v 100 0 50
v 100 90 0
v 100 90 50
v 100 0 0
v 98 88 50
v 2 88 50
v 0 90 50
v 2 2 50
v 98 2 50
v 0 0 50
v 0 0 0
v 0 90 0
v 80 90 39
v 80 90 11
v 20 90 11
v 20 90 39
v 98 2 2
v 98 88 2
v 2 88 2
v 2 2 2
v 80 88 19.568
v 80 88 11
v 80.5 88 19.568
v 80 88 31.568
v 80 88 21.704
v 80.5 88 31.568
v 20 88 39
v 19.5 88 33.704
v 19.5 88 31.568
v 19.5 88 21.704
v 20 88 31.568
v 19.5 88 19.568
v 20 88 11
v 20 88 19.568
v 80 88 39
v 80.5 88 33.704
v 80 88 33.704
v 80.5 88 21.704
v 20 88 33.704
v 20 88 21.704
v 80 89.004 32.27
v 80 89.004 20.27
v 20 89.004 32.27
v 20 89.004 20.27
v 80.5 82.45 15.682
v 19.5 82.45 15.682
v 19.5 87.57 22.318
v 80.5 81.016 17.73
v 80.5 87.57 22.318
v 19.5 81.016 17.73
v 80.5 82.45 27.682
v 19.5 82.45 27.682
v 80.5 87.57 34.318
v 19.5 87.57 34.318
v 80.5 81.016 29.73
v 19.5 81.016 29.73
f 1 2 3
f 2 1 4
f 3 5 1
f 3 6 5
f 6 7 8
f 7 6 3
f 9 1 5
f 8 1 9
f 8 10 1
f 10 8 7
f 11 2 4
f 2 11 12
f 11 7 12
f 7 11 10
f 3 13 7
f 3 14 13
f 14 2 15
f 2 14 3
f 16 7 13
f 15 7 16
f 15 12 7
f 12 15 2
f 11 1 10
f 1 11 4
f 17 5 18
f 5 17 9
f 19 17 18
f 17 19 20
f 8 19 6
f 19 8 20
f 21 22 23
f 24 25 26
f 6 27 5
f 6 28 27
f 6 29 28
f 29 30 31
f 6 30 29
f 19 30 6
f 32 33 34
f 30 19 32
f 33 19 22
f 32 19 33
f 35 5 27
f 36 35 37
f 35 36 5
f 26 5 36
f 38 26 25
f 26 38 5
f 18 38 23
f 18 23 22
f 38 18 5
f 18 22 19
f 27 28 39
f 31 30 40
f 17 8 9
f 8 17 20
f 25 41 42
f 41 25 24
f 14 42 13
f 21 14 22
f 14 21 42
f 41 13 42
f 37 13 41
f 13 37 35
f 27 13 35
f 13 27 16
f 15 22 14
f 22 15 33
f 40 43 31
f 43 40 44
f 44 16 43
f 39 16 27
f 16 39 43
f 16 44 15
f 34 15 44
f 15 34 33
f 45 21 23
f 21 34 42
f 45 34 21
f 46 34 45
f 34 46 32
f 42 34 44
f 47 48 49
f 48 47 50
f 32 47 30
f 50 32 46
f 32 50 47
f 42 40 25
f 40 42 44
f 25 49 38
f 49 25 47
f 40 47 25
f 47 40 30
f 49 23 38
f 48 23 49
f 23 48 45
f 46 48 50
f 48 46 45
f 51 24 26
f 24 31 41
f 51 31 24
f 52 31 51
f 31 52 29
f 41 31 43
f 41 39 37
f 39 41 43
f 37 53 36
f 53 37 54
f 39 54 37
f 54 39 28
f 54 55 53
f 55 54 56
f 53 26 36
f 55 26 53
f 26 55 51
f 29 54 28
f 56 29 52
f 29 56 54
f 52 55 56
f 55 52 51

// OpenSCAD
$fn = 32;

// ----------------------------------------------------------------------
// Vent box: louvers enclosure
// ----------------------------------------------------------------------

// --- parameters (mm) ---
box_l = 100;              // box length, X
box_w = 90;               // box width, Y
box_h = 50;               // box height, Z
wall_t = 2;               // shell wall thickness
win_l = 60;               // vent window width, X
win_h = 28;               // vent window height, Z
slat_t = 2.5;             // louver slat thickness
slat_d = 8;               // louver slat depth
slat_a = 35;              // louver slat angle, degrees
slat_pitch = 12;          // louver pitch
slat_yc = 85.01;          // slat centreline Y

win_z0 = (box_h - win_h) / 2;  // window lower edge Z
n_slats = 2;  // louver count
slat_z0 = win_z0 + (win_h - (n_slats - 1) * slat_pitch) / 2;

difference() {
  union() {
    difference() {
      cube([box_l, box_w, box_h]);
  translate([wall_t, wall_t, wall_t])
    cube([box_l - 2 * wall_t, box_w - 2 * wall_t, box_h]);
  translate([(box_l - win_l) / 2, box_w - wall_t - 1, win_z0])
    cube([win_l, wall_t + 2, win_h]);
    }
    for (i = [0 : n_slats - 1])
      translate([box_l / 2, slat_yc, slat_z0 + i * slat_pitch])
        rotate([slat_a, 0, 0])
          cube([win_l + 1, slat_d, slat_t], center = true);
  }
}
